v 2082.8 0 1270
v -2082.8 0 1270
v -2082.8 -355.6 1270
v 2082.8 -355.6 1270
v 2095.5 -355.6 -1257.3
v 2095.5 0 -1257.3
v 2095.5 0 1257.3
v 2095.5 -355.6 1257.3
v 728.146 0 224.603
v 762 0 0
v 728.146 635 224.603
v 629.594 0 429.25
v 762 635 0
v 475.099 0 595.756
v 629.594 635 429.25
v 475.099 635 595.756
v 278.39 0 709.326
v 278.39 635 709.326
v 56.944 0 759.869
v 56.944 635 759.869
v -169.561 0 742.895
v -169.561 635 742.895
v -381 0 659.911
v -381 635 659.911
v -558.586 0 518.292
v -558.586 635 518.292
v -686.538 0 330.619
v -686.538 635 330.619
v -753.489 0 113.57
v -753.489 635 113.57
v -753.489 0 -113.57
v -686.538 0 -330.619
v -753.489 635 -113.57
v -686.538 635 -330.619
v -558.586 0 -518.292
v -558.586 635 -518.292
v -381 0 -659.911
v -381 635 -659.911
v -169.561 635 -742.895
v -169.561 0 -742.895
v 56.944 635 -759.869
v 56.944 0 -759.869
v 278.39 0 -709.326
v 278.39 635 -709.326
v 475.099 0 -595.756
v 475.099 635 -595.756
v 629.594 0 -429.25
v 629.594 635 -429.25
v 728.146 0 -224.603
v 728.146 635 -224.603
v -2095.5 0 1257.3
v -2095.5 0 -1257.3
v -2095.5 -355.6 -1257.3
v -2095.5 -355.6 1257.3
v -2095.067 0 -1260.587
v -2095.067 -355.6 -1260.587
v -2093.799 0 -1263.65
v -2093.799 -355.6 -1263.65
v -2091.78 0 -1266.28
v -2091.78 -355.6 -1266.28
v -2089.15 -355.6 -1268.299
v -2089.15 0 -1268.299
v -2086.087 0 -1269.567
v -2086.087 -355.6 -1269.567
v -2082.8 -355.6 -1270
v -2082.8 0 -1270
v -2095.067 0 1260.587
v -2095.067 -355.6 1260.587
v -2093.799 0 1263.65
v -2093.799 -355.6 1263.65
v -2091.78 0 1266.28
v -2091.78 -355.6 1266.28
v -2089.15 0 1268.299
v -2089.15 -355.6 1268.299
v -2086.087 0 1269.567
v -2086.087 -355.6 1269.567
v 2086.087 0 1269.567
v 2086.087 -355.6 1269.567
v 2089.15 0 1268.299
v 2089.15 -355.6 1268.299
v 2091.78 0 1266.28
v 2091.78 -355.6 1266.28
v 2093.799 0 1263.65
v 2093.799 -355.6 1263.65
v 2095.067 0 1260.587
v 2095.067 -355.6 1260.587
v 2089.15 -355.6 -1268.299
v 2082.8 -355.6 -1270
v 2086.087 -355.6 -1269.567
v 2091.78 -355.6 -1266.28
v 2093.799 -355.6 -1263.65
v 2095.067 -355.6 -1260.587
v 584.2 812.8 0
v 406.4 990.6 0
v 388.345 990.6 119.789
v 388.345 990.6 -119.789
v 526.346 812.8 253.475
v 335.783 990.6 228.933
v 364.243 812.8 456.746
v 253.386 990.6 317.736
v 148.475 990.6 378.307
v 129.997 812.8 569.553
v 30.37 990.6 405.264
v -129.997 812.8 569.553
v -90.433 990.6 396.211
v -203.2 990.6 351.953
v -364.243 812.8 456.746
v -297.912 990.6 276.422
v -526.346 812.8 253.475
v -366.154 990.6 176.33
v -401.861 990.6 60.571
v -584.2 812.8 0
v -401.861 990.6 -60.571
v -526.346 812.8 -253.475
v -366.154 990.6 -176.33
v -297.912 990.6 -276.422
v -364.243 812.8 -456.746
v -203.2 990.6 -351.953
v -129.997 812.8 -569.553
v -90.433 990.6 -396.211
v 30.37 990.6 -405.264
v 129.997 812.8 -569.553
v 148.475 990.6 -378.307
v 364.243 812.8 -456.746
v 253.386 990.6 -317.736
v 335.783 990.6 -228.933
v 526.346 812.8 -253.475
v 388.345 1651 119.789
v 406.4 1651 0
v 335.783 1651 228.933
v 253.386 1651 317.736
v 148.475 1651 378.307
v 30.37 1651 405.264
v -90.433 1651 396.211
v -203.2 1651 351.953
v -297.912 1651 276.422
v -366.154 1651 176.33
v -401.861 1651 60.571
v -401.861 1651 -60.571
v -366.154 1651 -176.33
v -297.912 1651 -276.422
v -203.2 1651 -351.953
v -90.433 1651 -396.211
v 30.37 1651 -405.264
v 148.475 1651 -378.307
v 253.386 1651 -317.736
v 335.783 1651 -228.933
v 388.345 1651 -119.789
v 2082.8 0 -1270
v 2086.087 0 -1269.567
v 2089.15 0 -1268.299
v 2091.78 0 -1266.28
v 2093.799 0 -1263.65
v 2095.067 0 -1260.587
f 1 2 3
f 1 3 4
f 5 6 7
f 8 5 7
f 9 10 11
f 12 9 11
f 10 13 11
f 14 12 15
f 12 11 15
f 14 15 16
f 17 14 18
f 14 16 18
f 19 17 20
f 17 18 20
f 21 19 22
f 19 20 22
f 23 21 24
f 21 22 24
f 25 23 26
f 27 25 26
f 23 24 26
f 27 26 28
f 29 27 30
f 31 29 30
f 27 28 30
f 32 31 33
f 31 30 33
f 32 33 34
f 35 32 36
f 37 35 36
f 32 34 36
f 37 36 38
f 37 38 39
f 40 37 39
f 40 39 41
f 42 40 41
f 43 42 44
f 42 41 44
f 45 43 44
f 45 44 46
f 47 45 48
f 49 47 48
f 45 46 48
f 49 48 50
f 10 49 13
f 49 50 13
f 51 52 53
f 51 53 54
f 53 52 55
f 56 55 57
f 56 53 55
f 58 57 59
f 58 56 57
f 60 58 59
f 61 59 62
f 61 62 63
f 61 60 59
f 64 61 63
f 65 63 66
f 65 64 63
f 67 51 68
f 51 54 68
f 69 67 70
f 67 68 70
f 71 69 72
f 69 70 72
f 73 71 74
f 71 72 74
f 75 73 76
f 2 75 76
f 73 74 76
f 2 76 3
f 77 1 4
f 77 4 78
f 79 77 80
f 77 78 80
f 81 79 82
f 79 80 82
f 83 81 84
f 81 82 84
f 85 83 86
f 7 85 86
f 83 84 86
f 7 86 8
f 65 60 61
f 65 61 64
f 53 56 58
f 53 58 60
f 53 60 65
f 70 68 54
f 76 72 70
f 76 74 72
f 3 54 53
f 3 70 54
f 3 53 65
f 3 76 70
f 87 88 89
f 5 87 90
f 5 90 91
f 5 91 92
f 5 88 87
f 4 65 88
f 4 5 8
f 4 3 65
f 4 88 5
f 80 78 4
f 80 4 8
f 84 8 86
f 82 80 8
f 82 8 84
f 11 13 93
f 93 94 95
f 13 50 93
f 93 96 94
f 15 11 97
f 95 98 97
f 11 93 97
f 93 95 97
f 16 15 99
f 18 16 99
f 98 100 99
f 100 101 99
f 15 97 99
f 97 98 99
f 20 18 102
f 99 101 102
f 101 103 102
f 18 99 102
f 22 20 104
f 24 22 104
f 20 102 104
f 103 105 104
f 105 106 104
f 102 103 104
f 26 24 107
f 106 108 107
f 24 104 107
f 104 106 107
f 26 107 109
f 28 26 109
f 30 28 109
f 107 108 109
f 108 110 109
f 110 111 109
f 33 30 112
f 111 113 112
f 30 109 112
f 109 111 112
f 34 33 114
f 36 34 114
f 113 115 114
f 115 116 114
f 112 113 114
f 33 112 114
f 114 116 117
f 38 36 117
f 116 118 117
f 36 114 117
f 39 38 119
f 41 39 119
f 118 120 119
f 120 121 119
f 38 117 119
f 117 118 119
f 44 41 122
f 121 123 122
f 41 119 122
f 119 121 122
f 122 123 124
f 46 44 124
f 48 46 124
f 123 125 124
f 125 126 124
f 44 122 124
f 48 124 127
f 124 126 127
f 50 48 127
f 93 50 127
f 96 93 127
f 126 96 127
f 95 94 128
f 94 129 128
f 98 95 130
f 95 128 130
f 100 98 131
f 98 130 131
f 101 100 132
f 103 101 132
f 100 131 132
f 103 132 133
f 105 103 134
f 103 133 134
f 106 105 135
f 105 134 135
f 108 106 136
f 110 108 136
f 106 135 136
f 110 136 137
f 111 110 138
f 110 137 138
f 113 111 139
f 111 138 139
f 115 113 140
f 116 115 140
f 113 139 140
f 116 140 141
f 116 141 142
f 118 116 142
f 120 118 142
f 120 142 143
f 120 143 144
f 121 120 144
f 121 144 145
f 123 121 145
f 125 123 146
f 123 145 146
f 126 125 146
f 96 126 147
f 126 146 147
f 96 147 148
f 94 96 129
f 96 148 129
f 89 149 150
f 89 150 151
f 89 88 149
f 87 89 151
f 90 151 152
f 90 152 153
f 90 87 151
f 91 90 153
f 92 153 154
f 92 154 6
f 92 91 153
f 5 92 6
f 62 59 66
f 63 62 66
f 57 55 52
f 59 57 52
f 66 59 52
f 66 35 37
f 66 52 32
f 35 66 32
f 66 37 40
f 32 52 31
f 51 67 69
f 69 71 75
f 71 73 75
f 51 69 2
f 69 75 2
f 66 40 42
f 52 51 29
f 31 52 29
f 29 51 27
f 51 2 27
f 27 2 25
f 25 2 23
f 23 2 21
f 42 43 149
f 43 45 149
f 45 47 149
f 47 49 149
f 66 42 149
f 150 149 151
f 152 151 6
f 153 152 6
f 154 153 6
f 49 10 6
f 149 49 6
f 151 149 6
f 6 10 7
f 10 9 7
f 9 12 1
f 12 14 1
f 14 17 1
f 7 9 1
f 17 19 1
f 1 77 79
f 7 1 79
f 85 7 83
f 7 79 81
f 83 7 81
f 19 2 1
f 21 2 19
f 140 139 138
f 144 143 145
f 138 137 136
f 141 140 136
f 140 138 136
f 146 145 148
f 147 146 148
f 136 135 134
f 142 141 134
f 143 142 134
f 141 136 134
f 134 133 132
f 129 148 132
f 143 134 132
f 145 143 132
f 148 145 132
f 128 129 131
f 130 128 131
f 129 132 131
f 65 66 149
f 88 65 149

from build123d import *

# Parameters (mm, degrees)
F2_W     = 4191
F2_H     = 2540
F3_DEPTH = 355.6
F4_R     = 12.7


with BuildPart() as f1:
    # F0 (on Top) → F1 (revolve)
    with BuildSketch(Plane.XY):
        Polygon((0, 1651), (0, 0), (762, 0), (762, 635), (406.4, 990.6), (406.4, 1651), align=None)
    revolve(axis=Axis((0, 825.5, 0), (0, -1, 0)))

    # F2 (on face) → F3 (join)
    with BuildSketch(Plane.XZ):
        Rectangle(F2_W, F2_H)
    extrude(amount=F3_DEPTH)

    # F4
    f4_edges = [f1.edges().sort_by_distance(p)[0] for p in [
        (-2095.5, -177.8, -1270),
        (-2095.5, -177.8, 1270),
        (2095.5, -177.8, 1270),
        (2095.5, -177.8, -1270),
    ]]
    fillet(f4_edges, radius=F4_R)


solid = f1.part
